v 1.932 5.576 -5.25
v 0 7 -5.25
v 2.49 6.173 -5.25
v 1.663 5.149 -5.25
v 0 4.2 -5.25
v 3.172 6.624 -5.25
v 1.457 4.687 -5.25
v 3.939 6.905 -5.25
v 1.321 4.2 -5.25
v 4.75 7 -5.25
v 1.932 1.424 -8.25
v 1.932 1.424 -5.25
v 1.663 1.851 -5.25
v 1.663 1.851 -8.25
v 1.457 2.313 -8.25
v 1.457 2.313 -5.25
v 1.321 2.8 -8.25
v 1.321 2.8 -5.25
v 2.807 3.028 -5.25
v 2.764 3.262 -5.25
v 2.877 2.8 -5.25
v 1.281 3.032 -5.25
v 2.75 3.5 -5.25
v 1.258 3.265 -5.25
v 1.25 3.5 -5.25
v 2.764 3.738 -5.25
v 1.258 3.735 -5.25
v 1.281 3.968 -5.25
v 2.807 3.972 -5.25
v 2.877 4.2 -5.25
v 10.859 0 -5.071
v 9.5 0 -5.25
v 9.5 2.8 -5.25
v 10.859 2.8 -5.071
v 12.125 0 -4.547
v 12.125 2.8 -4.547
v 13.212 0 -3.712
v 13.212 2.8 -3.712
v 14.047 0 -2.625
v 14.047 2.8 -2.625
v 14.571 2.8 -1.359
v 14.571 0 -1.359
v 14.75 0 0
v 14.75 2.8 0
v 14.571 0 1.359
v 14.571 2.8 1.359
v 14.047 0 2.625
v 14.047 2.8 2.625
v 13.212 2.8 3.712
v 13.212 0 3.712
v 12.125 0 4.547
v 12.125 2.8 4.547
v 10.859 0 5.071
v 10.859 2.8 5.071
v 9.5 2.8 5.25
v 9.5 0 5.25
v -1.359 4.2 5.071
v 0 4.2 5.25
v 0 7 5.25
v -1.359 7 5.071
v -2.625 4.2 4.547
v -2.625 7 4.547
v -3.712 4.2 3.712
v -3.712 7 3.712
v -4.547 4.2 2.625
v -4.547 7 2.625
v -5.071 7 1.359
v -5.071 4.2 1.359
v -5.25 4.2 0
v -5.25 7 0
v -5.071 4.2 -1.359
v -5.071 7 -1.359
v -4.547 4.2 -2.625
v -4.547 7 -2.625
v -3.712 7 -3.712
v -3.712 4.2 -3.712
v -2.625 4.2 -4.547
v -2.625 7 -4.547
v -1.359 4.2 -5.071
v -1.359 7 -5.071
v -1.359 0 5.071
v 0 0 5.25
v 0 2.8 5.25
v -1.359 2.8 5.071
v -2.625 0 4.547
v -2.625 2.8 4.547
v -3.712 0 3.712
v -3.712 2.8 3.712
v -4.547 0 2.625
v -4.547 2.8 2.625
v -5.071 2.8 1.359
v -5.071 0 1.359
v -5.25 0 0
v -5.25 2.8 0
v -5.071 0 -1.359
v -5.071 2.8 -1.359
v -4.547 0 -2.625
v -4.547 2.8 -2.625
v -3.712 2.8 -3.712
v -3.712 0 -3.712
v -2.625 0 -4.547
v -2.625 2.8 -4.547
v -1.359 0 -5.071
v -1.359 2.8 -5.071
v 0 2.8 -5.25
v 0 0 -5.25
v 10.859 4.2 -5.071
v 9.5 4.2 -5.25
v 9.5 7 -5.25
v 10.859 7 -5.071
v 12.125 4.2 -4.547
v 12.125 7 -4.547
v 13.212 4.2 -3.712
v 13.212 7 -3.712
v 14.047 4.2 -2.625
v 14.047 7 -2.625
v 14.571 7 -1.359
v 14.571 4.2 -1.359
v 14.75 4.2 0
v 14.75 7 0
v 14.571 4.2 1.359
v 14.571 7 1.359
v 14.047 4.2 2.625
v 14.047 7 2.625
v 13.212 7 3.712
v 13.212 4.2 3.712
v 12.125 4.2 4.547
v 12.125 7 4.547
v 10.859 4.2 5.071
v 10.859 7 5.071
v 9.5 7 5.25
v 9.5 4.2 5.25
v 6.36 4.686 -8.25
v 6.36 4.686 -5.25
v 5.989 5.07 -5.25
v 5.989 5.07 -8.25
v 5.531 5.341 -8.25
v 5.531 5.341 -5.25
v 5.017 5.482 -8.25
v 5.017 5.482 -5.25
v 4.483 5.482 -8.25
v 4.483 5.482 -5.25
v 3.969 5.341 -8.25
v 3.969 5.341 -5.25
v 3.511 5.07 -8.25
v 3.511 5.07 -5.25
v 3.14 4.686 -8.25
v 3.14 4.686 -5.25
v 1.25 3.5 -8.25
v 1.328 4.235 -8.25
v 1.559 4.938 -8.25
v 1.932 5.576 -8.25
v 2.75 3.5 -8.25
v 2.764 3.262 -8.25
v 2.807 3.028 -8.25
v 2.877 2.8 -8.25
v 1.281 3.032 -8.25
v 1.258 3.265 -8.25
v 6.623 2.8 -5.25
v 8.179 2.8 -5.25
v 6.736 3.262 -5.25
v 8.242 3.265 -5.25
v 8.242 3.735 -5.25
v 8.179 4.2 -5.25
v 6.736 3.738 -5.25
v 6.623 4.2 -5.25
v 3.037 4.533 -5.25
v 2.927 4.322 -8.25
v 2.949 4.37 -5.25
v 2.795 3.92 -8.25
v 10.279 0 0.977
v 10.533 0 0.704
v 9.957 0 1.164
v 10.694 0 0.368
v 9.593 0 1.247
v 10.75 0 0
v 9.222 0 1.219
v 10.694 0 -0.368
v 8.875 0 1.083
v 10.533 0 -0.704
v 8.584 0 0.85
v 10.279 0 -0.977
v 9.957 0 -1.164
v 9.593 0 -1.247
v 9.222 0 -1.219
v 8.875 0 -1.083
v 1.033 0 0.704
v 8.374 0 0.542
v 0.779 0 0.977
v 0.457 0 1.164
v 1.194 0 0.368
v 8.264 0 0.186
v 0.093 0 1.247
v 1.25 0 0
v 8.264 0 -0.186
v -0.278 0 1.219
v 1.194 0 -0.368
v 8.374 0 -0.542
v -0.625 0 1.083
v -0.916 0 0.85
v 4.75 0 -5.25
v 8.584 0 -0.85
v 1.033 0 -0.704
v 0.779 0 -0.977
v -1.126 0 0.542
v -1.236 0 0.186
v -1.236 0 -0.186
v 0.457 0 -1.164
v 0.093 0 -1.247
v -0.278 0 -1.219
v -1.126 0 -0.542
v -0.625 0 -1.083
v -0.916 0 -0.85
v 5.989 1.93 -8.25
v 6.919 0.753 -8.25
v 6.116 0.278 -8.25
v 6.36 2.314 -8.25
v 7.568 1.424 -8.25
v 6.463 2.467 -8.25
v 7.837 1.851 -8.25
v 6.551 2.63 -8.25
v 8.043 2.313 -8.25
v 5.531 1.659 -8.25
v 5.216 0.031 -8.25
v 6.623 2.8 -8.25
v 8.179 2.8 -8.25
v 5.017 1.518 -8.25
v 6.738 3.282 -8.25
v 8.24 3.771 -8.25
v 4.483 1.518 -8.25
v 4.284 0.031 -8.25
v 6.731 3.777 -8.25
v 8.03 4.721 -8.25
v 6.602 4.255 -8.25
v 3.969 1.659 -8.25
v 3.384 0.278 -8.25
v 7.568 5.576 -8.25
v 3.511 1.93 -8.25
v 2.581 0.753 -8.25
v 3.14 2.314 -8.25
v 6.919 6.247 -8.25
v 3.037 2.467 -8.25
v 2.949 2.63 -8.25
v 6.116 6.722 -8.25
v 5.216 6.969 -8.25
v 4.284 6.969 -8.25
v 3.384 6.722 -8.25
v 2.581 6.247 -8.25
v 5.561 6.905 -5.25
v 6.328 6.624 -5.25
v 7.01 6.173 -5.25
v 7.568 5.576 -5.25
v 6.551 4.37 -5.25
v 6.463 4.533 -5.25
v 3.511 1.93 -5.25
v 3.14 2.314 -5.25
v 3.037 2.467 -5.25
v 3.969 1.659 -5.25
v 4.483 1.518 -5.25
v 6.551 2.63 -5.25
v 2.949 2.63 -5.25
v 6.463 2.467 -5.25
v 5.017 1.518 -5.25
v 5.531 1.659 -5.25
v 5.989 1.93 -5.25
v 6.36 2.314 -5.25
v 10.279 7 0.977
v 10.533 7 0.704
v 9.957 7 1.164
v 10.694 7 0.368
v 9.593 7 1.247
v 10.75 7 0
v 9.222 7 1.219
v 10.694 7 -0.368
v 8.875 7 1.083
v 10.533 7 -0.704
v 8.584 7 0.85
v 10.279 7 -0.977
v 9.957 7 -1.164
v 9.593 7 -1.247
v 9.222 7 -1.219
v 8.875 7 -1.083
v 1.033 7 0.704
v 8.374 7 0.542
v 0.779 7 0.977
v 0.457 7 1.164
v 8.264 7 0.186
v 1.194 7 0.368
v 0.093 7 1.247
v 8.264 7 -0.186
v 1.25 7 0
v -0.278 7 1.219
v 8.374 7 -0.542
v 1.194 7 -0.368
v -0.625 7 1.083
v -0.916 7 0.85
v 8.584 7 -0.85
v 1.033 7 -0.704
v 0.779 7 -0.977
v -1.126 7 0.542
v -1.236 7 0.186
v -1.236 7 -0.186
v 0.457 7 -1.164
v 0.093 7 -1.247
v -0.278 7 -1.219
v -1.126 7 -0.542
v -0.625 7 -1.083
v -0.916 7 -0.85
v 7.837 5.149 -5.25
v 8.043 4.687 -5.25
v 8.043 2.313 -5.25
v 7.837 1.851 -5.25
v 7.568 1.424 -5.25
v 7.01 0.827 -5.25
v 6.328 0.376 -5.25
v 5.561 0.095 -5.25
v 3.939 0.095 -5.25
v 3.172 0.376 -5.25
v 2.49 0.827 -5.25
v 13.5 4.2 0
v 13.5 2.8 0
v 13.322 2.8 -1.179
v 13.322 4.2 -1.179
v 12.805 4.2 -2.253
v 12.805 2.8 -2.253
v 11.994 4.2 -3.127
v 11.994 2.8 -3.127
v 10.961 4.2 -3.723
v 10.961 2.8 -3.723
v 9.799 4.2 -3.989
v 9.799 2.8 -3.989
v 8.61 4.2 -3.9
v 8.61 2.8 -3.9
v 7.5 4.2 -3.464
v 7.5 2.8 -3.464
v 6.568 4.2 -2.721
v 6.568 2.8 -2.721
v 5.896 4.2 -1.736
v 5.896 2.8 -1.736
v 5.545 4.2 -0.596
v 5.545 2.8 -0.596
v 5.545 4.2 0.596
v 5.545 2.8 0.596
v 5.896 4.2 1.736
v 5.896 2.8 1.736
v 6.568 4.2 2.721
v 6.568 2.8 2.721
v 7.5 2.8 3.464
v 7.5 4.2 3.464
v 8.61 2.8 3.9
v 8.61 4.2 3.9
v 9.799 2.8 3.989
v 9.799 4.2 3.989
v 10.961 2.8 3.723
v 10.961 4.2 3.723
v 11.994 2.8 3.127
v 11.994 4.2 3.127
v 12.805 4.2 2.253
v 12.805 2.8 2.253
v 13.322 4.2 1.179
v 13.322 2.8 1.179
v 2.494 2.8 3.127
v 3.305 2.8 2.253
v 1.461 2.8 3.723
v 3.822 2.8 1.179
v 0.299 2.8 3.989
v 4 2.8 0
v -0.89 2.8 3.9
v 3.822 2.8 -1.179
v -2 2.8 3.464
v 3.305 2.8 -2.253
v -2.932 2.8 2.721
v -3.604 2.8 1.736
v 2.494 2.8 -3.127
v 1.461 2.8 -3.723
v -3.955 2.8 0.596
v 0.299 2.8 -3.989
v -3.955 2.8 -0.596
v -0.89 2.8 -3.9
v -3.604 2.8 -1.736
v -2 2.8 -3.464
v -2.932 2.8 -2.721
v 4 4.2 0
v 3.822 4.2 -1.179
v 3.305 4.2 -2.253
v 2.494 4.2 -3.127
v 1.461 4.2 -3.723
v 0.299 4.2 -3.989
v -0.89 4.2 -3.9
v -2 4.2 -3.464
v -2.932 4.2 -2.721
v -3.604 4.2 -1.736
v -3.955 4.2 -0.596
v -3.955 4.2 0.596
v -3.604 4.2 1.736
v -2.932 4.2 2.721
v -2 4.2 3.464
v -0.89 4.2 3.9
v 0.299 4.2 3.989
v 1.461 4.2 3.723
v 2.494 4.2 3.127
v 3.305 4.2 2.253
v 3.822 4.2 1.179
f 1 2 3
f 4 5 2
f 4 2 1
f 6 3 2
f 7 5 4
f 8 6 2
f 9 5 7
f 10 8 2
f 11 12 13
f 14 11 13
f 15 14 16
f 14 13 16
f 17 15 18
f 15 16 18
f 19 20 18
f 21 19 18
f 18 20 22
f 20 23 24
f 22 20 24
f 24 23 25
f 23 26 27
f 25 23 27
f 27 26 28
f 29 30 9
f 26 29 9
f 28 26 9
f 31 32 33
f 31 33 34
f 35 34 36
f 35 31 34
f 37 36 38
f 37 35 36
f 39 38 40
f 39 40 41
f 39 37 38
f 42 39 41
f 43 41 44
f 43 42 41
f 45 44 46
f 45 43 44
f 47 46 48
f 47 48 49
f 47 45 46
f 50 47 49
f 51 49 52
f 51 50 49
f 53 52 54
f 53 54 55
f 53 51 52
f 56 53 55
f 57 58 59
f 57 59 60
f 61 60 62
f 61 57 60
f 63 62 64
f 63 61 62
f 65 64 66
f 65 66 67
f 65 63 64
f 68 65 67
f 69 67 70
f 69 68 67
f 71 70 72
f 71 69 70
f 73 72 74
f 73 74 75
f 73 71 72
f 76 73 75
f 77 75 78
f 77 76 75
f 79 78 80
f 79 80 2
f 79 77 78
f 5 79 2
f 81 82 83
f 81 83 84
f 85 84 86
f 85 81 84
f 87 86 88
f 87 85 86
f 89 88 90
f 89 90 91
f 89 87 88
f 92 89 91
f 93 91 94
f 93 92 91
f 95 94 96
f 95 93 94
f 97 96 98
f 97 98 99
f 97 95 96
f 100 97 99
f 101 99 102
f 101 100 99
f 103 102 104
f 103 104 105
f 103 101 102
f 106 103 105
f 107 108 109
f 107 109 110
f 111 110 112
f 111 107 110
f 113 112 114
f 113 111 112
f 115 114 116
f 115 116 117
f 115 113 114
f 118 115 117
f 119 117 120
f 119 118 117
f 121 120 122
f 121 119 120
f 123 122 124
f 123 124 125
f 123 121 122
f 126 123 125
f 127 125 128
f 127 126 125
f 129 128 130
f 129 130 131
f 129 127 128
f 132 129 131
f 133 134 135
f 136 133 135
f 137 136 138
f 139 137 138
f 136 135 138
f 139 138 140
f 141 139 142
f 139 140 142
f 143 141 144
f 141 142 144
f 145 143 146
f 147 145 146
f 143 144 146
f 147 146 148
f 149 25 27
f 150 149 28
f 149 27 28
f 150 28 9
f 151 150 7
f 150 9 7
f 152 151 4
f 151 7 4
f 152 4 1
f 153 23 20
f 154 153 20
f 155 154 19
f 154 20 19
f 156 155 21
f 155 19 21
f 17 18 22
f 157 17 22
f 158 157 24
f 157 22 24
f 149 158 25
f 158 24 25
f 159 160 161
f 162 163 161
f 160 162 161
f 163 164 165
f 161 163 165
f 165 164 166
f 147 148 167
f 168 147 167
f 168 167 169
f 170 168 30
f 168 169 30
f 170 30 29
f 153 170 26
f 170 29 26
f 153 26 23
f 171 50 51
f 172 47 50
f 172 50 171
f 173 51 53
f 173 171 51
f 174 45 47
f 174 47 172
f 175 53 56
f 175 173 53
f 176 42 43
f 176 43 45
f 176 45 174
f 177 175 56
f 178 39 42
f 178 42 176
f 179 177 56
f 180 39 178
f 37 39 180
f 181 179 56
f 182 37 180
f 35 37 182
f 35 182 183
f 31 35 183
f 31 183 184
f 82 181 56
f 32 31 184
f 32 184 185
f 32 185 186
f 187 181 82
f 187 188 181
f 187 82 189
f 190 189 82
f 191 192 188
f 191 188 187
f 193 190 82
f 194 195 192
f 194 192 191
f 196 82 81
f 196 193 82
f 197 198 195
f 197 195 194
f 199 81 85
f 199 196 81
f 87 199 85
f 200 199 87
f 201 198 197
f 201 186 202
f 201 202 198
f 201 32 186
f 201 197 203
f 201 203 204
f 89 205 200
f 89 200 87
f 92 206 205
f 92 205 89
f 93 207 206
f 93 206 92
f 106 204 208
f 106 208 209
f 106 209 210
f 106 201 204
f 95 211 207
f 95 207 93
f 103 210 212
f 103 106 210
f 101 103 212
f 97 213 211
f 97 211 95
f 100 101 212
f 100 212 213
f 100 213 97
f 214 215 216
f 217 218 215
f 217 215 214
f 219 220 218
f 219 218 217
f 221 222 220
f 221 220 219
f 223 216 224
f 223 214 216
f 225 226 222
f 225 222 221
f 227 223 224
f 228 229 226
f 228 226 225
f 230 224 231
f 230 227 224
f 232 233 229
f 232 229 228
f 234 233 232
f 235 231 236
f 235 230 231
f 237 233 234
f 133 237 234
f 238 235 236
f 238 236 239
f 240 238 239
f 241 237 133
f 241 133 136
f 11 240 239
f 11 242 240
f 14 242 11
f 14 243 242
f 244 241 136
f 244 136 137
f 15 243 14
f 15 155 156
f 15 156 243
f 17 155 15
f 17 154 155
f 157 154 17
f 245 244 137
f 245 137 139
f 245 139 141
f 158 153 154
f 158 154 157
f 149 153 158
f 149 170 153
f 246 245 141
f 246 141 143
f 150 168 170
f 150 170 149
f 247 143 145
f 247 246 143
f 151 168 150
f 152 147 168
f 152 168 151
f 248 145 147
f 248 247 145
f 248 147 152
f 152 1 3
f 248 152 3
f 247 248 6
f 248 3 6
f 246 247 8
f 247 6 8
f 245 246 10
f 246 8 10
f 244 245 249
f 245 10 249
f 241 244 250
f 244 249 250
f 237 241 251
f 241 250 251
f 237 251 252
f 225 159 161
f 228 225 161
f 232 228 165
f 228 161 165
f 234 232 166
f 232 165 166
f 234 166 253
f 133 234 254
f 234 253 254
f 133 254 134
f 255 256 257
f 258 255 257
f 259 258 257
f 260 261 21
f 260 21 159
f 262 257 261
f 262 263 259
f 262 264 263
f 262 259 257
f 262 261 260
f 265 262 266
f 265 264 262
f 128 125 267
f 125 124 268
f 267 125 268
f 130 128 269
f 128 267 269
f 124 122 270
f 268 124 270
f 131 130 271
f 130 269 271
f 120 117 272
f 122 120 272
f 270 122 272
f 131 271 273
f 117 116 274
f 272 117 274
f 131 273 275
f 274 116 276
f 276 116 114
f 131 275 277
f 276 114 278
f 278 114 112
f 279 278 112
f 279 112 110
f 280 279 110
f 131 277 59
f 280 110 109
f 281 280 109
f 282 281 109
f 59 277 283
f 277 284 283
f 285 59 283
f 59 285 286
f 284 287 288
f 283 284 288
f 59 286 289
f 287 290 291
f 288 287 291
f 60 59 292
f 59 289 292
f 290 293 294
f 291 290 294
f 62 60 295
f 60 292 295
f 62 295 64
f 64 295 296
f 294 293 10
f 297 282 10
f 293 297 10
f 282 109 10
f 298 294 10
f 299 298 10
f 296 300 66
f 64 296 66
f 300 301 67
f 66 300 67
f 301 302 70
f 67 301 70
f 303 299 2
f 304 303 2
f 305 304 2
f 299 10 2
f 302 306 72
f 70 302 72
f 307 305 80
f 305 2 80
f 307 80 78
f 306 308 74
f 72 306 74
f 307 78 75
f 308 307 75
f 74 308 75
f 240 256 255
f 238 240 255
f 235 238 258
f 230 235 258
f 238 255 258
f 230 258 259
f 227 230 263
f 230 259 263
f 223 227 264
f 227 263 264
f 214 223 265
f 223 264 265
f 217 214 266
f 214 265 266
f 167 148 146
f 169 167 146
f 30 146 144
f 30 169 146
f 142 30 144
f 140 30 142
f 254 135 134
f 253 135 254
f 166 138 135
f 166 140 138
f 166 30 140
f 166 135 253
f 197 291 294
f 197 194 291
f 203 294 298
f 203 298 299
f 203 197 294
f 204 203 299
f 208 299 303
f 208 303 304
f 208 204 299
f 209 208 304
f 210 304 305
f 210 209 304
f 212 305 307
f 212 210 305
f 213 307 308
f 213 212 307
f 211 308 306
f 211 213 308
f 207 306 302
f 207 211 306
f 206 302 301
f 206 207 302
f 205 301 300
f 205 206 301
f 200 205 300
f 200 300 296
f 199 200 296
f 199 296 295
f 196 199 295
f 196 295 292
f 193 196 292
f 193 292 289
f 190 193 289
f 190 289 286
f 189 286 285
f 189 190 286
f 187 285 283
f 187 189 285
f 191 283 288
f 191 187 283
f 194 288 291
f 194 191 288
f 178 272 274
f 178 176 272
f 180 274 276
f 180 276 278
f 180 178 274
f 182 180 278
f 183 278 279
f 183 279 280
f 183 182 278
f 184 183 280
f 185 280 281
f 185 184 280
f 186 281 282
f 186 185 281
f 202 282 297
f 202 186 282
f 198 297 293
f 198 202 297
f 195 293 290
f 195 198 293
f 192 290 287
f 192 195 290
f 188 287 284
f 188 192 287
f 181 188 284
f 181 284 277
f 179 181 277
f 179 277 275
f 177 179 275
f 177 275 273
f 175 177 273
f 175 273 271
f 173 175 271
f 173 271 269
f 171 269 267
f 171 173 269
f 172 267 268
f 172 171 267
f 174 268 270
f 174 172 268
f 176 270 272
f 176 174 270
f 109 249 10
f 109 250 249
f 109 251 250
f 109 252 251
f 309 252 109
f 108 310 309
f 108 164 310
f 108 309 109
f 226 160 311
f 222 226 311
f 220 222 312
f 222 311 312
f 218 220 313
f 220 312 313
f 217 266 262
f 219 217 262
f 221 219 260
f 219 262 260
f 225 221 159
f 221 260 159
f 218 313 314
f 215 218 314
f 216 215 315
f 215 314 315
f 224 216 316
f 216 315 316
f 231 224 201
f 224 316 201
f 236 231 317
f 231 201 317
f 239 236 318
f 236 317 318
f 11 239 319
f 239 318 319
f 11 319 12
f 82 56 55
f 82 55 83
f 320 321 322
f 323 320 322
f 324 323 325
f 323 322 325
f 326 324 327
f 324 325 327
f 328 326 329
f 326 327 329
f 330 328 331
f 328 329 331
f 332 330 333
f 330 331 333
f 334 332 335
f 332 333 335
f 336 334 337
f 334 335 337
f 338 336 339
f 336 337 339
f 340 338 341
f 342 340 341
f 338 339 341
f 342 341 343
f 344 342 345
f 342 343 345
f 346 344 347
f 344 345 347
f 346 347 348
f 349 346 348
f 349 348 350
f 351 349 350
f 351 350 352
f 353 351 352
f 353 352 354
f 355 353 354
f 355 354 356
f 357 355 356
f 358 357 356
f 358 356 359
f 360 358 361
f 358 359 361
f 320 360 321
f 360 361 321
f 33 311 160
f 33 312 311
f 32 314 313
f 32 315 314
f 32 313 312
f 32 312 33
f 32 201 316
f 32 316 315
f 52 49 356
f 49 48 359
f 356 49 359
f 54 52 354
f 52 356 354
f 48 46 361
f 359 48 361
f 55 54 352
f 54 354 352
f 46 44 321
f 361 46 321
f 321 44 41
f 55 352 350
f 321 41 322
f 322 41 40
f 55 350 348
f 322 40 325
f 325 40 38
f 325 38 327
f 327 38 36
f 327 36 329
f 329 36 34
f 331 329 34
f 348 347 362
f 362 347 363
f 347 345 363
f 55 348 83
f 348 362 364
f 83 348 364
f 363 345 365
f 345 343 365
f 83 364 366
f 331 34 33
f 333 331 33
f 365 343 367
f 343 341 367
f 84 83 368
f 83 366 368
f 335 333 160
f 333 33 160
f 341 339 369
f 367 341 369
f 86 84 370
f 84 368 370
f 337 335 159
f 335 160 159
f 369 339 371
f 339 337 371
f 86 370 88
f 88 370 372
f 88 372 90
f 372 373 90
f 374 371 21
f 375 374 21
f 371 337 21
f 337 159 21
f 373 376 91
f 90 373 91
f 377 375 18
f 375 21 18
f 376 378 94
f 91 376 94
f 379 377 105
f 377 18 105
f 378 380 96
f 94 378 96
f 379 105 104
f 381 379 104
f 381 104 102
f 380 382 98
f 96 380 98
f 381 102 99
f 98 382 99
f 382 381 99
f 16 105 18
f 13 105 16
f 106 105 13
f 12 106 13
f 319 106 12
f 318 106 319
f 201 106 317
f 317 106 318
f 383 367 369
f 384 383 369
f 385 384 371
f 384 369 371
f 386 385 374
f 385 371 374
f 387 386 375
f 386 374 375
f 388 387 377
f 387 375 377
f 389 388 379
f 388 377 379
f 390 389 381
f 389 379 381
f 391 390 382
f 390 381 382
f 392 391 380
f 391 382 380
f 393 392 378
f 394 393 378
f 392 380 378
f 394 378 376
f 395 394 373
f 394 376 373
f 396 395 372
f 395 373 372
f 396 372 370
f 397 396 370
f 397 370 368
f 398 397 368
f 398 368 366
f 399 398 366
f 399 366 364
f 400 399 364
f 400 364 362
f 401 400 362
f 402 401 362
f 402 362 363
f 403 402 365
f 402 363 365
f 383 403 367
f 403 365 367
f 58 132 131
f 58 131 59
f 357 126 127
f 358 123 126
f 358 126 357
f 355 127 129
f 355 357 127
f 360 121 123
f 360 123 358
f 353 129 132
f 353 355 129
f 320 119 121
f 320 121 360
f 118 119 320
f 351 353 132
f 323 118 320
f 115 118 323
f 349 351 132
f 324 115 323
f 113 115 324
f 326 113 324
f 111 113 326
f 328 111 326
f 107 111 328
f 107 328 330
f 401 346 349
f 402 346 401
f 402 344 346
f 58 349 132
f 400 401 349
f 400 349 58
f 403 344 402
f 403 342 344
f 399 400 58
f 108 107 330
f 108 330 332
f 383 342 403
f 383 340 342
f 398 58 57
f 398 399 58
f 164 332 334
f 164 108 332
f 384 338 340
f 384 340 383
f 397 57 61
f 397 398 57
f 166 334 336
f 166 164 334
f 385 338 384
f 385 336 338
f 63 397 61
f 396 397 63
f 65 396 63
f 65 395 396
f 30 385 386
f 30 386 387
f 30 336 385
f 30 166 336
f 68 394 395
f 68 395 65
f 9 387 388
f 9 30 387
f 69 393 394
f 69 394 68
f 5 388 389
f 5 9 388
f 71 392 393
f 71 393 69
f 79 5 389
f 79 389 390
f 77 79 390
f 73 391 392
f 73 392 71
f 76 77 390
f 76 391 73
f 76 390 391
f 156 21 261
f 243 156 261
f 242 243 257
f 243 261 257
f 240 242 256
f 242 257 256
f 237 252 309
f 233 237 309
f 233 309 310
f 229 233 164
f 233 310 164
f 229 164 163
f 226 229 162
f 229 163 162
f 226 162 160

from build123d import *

# Parameters (mm, degrees)
SKETCH_1_R      = 1.25
EXTRUDE_1_DEPTH = 2.8
SKETCH_2_R      = 4
SKETCH_2_R_2    = 1.25
EXTRUDE_2_DEPTH = 1.4
SKETCH_3_R      = 1.25
EXTRUDE_3_DEPTH = 2.8
EXTRUDE_4_DEPTH = 3


with BuildPart() as part:
    # 草图1 → 凸台-拉伸1 (new body)
    with BuildSketch(Plane(origin=(0, 0, 0), x_dir=(1, 0, 0), z_dir=(0, 1, 0))):
        with BuildLine():
            Line((0, 5.25), (9.5, 5.25))
            ThreePointArc((9.5, 5.25), (14.75, 0), (9.5, -5.25))
            Line((9.5, -5.25), (0, -5.25))
            ThreePointArc((0, -5.25), (-5.25, 0), (0, 5.25))
        make_face()
        Circle(SKETCH_1_R, mode=Mode.SUBTRACT)
        with Locations((9.5, 0)):
            Circle(SKETCH_1_R, mode=Mode.SUBTRACT)
    extrude(amount=EXTRUDE_1_DEPTH)

    # 草图2 → 凸台-拉伸2 (add)
    with BuildSketch(Plane(origin=(0, 2.8, 0), x_dir=(1, 0, 0), z_dir=(0, 1, 0))):
        Circle(SKETCH_2_R)
        Circle(SKETCH_2_R_2, mode=Mode.SUBTRACT)
        with Locations((9.5, 0)):
            Circle(SKETCH_2_R)
        with Locations((9.5, 0)):
            Circle(SKETCH_2_R_2, mode=Mode.SUBTRACT)
    extrude(amount=EXTRUDE_2_DEPTH)

    # 草图3 → 凸台-拉伸3 (add)
    with BuildSketch(Plane(origin=(0, 4.2, 0), x_dir=(1, 0, 0), z_dir=(0, 1, 0))):
        with BuildLine():
            Line((0, 5.25), (9.5, 5.25))
            ThreePointArc((9.5, 5.25), (14.75, 0), (9.5, -5.25))
            Line((9.5, -5.25), (0, -5.25))
            ThreePointArc((0, -5.25), (-5.25, 0), (0, 5.25))
        make_face()
        Circle(SKETCH_3_R, mode=Mode.SUBTRACT)
        with Locations((9.5, 0)):
            Circle(SKETCH_3_R, mode=Mode.SUBTRACT)
    extrude(amount=EXTRUDE_3_DEPTH)

    # 草图4 → 凸台-拉伸4 (add)
    with BuildSketch(Plane(origin=(0, 0, -5.25), x_dir=(-1, 0, 0), z_dir=(0, 0, -1))):
        with BuildLine():
            ThreePointArc((-1.932304569, 5.576196633), (-4.75, 7), (-7.567695431, 5.576196633))
            Line((-7.567695431, 5.576196633), (-6.360111675, 4.686398076))
            ThreePointArc((-6.360111675, 4.686398076), (-4.75, 5.5), (-3.139888325, 4.686398076))
            Line((-3.139888325, 4.686398076), (-1.932304569, 5.576196633))
        make_face()
        with BuildLine():
            Line((-6.360111675, 2.313601924), (-7.567695431, 1.423803367))
            ThreePointArc((-7.567695431, 1.423803367), (-4.75, 0), (-1.932304569, 1.423803367))
            Line((-1.932304569, 1.423803367), (-3.139888325, 2.313601924))
            ThreePointArc((-3.139888325, 2.313601924), (-4.75, 1.5), (-6.360111675, 2.313601924))
        make_face()
        with BuildLine():
            Line((-6.360111675, 4.686398076), (-7.567695431, 5.576196633))
            ThreePointArc((-7.567695431, 5.576196633), (-8.168041846, 4.252987343), (-8.17928564, 2.8))
            Line((-8.17928564, 2.8), (-6.6234994, 2.8))
            ThreePointArc((-6.6234994, 2.8), (-6.730785439, 3.77656653), (-6.360111675, 4.686398076))
        make_face()
        with BuildLine():
            ThreePointArc((-1.932304569, 1.423803367), (-1.551614092, 2.078617721), (-1.32071436, 2.8))
            Line((-1.32071436, 2.8), (-2.8765006, 2.8))
            ThreePointArc((-2.8765006, 2.8), (-2.99129812, 2.547651483), (-3.139888325, 2.313601924))
            Line((-3.139888325, 2.313601924), (-1.932304569, 1.423803367))
        make_face()
        with BuildLine():
            ThreePointArc((-1.25, 3.5), (-1.424948571, 4.592718169), (-1.932304569, 5.576196633))
            Line((-1.932304569, 5.576196633), (-3.139888325, 4.686398076))
            ThreePointArc((-3.139888325, 4.686398076), (-2.849970612, 4.124410382), (-2.75, 3.5))
            ThreePointArc((-2.75, 3.5), (-2.781879221, 3.144330771), (-2.8765006, 2.8))
            Line((-2.8765006, 2.8), (-1.32071436, 2.8))
            ThreePointArc((-1.32071436, 2.8), (-1.267723464, 3.148218633), (-1.25, 3.5))
        make_face()
        with BuildLine():
            Line((-6.6234994, 2.8), (-8.17928564, 2.8))
            ThreePointArc((-8.17928564, 2.8), (-7.948385908, 2.078617721), (-7.567695431, 1.423803367))
            Line((-7.567695431, 1.423803367), (-6.360111675, 2.313601924))
            ThreePointArc((-6.360111675, 2.313601924), (-6.50870188, 2.547651483), (-6.6234994, 2.8))
        make_face()
    extrude(amount=EXTRUDE_4_DEPTH)


solid = part.part
